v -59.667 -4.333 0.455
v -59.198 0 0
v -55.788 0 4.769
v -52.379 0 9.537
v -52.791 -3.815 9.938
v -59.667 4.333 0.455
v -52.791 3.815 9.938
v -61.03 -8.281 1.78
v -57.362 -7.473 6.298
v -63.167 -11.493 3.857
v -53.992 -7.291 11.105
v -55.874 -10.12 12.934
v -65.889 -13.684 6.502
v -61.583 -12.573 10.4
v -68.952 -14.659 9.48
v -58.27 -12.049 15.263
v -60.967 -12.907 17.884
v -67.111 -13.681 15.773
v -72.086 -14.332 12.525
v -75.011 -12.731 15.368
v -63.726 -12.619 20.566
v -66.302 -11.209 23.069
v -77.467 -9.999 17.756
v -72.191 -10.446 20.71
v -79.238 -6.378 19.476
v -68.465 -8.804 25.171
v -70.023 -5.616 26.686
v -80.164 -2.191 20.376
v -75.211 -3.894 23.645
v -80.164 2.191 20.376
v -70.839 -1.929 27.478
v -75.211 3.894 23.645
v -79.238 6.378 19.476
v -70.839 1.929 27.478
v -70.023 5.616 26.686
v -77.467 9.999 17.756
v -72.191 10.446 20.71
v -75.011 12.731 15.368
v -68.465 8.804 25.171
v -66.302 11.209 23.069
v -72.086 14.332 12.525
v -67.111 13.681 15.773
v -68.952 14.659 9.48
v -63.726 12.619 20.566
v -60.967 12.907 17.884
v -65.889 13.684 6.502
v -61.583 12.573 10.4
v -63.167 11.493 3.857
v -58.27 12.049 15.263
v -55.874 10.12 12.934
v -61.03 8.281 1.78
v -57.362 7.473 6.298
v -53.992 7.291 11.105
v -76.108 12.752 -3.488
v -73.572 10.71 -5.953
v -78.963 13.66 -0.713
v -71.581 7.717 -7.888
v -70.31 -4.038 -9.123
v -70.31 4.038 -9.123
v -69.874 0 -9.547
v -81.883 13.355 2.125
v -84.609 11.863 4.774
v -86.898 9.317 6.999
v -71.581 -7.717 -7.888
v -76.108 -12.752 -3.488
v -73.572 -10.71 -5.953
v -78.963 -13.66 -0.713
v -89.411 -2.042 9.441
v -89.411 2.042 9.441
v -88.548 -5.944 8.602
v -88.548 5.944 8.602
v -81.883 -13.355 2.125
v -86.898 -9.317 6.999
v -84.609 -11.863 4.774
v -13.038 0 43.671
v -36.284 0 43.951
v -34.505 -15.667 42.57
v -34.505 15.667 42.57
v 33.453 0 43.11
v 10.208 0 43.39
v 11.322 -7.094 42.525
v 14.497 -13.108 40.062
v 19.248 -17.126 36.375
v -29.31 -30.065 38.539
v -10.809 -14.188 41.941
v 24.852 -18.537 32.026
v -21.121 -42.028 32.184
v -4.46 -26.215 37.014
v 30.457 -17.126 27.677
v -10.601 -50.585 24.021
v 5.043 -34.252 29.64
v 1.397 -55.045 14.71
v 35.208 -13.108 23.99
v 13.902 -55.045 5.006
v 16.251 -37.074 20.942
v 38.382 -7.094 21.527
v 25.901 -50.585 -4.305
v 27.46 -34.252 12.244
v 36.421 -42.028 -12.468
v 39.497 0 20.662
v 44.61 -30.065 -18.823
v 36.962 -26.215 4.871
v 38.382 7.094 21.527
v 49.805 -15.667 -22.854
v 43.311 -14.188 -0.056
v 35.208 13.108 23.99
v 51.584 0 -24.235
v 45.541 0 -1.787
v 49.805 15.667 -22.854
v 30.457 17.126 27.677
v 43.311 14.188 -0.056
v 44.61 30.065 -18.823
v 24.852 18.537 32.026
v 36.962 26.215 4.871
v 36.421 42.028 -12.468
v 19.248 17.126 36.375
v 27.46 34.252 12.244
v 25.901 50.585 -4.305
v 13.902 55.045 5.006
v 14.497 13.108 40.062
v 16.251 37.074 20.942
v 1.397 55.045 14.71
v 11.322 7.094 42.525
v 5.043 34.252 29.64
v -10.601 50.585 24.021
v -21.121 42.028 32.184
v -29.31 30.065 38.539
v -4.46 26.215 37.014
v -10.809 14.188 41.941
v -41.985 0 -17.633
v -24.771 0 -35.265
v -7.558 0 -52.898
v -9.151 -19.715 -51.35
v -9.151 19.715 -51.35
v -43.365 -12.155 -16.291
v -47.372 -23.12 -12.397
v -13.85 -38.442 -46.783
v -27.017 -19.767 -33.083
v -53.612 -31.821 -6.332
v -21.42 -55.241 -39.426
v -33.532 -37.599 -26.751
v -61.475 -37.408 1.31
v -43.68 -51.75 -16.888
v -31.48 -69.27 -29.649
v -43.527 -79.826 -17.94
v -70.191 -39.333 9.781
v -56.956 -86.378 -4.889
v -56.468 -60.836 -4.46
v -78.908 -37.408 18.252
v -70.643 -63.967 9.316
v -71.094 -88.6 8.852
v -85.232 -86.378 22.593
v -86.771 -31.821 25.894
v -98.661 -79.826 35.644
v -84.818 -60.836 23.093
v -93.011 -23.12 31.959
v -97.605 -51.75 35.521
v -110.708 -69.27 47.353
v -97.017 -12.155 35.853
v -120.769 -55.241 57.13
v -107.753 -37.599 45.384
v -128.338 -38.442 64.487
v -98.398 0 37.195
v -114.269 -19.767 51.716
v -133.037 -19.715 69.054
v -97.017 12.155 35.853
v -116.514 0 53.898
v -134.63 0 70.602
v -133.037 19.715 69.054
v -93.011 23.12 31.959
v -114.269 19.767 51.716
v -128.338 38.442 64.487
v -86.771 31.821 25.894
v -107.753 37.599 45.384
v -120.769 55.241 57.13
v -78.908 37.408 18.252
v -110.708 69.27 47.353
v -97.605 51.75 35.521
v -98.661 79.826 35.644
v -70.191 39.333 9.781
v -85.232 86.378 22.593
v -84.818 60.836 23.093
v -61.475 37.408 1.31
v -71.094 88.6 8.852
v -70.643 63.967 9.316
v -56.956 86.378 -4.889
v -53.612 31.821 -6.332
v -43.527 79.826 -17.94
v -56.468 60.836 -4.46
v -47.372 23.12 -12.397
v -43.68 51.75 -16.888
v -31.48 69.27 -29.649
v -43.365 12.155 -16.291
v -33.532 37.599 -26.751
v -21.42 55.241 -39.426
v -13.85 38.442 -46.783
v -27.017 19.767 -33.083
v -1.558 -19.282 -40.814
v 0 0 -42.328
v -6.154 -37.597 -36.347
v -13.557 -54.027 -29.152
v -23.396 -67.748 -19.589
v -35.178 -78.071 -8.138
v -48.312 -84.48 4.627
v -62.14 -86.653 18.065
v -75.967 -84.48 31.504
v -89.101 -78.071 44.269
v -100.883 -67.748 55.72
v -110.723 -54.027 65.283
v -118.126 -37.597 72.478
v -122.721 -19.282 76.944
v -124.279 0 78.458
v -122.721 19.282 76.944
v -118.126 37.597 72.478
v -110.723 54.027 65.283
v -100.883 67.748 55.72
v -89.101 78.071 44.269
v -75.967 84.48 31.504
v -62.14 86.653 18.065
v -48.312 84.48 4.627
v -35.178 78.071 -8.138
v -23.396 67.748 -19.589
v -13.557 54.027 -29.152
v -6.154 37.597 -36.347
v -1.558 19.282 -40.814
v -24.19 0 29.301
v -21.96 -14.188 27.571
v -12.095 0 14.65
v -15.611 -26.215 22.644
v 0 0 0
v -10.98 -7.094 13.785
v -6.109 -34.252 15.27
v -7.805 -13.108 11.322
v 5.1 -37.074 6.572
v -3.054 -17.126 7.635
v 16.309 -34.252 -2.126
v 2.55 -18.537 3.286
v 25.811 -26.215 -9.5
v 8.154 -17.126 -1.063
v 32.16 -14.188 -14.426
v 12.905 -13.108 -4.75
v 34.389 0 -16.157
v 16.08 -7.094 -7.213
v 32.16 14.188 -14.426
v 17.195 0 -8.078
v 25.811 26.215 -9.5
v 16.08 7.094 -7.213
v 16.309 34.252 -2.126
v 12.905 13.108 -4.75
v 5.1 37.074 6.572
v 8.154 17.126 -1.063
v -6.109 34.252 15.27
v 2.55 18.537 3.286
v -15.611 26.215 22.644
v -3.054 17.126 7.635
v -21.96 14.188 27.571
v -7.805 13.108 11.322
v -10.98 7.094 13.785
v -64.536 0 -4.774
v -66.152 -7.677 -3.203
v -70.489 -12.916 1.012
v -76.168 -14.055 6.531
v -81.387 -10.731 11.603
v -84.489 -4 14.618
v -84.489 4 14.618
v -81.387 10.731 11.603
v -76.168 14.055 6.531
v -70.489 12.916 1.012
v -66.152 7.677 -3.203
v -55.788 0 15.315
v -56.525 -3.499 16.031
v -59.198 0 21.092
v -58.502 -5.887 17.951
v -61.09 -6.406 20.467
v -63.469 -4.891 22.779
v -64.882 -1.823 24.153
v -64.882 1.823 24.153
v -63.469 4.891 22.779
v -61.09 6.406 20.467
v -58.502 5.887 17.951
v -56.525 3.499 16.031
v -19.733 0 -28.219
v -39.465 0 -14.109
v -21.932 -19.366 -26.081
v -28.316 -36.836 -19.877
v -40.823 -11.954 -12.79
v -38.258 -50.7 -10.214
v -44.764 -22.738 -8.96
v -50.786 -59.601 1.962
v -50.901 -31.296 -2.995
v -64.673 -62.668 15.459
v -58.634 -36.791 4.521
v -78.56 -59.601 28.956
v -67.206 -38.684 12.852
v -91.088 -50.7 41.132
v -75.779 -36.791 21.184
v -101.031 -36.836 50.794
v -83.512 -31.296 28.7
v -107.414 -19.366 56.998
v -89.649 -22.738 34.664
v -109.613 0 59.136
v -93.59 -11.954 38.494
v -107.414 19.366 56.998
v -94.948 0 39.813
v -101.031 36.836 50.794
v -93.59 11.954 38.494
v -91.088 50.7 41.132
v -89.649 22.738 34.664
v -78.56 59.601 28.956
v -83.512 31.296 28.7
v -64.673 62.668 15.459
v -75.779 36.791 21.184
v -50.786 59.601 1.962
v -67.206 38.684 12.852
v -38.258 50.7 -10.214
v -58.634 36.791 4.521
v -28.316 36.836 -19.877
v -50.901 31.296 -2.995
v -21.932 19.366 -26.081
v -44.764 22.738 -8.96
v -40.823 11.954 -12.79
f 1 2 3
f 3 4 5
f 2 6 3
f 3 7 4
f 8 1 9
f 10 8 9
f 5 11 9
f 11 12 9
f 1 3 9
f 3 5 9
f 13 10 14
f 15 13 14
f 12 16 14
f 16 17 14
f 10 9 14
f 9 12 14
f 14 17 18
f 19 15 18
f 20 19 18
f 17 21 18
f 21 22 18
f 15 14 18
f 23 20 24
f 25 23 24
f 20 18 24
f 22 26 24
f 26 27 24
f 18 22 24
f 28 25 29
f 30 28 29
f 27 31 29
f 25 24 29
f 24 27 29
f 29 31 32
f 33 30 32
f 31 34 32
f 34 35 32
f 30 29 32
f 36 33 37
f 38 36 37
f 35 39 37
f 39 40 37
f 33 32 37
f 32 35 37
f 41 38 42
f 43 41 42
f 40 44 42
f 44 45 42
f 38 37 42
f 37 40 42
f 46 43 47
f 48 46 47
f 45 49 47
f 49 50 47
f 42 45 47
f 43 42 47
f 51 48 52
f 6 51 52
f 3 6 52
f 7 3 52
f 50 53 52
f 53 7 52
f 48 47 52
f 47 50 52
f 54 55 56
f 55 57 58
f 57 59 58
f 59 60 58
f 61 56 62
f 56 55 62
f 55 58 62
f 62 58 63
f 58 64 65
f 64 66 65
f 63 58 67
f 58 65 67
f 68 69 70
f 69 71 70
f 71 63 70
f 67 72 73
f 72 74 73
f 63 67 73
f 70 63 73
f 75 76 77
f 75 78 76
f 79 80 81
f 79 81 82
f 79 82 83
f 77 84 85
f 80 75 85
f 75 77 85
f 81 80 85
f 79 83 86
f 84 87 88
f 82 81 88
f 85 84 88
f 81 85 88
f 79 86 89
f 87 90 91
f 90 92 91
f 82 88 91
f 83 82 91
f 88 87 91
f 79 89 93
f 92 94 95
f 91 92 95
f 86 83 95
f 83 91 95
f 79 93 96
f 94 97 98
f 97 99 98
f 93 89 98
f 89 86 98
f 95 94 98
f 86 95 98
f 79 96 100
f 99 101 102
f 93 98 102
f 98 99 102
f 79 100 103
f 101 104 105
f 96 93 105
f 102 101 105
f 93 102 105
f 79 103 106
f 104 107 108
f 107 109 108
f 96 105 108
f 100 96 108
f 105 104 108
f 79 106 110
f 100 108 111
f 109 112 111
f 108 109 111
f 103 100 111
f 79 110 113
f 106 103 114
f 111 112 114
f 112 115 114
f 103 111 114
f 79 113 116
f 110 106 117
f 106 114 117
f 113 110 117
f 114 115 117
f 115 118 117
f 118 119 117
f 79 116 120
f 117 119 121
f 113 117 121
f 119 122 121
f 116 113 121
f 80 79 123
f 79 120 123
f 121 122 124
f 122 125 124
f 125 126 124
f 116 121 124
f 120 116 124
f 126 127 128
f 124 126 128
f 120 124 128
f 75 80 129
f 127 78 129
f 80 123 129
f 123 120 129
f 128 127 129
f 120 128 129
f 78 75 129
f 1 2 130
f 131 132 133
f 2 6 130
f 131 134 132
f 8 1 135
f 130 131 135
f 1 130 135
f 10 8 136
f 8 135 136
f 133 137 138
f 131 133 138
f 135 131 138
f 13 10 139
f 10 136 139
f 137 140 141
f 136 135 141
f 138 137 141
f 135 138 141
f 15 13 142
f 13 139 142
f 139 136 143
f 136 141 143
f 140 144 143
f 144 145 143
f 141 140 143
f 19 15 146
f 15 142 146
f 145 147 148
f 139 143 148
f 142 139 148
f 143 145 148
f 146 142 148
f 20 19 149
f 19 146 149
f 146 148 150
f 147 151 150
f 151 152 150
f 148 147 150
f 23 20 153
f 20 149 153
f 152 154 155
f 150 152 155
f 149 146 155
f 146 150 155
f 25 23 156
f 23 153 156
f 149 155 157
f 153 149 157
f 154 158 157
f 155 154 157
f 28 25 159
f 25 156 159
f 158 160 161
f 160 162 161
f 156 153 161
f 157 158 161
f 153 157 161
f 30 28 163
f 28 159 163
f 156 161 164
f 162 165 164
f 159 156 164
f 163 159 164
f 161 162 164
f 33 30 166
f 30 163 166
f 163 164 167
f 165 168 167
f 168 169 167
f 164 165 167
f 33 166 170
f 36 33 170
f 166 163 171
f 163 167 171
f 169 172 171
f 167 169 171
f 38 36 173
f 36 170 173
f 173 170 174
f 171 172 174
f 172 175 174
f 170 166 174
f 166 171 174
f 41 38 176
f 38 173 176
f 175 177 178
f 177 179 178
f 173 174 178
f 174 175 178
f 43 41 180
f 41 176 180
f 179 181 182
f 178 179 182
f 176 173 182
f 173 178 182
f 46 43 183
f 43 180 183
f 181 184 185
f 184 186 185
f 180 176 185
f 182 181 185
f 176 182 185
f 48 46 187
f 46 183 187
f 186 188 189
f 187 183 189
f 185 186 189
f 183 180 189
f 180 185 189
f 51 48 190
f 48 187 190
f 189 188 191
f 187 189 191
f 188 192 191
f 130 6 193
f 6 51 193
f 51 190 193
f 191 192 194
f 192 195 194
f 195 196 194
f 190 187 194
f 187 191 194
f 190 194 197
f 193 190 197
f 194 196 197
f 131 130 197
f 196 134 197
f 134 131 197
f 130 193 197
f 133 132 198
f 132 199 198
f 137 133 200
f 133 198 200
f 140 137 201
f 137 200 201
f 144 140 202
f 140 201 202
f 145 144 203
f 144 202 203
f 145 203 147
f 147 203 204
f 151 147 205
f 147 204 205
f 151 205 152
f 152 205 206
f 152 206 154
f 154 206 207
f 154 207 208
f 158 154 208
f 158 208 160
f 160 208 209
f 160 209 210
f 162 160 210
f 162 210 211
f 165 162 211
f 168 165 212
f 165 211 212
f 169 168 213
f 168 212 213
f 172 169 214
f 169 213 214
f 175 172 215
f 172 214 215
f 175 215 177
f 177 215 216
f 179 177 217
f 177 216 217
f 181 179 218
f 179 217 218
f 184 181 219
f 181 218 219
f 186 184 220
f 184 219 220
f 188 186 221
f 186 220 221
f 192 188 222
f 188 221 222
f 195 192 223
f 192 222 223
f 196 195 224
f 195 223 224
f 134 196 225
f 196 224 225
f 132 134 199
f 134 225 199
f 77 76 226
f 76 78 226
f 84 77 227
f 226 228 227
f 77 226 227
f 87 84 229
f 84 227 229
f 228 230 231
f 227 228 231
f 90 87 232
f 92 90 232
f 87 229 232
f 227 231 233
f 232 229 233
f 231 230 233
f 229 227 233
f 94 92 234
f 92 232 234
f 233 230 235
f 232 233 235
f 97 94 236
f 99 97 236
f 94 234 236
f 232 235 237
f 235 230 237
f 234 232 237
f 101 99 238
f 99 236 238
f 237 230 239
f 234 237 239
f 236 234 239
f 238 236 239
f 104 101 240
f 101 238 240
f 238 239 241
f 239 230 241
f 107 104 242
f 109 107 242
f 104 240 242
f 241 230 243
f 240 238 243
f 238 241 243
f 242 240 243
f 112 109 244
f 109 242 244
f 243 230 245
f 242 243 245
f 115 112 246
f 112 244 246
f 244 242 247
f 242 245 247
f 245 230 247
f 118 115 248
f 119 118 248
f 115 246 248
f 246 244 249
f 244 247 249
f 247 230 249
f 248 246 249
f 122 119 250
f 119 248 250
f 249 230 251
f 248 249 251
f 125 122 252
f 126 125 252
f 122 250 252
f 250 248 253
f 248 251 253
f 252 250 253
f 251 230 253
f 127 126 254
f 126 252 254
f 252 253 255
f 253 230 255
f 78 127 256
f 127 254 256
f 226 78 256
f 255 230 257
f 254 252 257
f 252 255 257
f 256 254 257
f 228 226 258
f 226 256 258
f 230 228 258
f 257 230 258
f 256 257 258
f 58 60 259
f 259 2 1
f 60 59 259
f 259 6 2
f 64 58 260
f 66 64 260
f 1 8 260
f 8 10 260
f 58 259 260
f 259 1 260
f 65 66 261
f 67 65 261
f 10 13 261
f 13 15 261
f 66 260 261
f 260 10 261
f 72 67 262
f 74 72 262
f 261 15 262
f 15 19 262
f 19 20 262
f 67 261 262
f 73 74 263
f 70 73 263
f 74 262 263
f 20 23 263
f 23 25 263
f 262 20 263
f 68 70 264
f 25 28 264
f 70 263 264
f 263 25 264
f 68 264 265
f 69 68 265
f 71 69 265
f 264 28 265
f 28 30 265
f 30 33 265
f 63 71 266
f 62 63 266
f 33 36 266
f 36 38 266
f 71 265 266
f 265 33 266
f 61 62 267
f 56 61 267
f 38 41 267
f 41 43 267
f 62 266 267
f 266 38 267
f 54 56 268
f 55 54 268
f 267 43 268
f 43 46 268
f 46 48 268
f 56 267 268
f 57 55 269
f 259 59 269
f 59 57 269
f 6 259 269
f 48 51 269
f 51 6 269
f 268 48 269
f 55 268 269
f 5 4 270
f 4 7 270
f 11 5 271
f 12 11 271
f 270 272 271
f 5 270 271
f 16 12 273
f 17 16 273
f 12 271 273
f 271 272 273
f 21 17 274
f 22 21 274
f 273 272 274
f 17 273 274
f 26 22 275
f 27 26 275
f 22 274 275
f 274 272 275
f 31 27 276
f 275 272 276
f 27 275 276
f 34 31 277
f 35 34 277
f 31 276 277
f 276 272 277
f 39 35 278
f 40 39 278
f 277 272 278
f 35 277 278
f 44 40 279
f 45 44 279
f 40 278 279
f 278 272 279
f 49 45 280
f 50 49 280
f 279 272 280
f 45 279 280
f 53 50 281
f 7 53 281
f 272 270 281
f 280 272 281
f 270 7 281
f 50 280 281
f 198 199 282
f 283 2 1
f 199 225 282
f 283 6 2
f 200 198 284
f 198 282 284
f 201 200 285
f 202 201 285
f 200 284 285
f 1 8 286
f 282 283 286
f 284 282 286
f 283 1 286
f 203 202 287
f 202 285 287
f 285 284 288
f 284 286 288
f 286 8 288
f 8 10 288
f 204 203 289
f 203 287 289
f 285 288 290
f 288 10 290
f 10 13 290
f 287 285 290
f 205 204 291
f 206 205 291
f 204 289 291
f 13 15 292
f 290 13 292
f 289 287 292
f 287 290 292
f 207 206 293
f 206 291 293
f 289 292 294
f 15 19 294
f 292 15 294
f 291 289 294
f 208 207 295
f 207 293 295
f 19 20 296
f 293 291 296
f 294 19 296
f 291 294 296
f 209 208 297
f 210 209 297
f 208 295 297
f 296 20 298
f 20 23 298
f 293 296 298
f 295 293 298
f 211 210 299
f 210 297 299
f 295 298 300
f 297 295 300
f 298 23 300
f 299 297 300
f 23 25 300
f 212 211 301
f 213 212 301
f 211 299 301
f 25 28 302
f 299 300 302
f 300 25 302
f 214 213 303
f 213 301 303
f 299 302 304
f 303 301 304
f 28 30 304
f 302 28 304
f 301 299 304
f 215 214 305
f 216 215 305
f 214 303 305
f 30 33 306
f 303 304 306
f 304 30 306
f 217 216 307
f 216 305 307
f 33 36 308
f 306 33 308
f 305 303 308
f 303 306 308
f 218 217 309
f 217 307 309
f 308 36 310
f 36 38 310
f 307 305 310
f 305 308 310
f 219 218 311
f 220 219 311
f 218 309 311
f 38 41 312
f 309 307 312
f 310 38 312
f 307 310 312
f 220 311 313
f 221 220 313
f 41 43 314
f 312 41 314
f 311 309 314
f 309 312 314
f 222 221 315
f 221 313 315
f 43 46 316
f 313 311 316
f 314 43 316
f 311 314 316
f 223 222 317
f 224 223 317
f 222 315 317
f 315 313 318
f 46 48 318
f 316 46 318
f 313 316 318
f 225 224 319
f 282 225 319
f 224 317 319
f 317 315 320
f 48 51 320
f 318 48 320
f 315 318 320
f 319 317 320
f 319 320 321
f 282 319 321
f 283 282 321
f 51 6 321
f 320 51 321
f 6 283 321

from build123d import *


with BuildPart() as f1:
    # F0 (on Front) → F1 (revolve)
    with BuildSketch(Plane.XZ):
        Polygon((33.4534868598, 43.1100986898), (-36.2842865288, 43.9511463046), (0, 0), align=None)
    revolve(axis=Axis((16.7267434299, 0, 21.5550493449), (0.6130656985, 0, 0.7900319293)))


with BuildPart() as f3:
    # F2 (on Front) → F3 (revolve)
    with BuildSketch(Plane.XZ):
        Polygon((-7.5580657161, -52.8982158507), (0, -42.3277616501), (-59.1981709003, 0), align=None)
    revolve(axis=Axis((-69.4477334619, 0, 10.5459876359), (-0.6969566993, 0, -0.7171132123)))


with BuildPart() as f3b:
    # F2 (on Front) → F3, piece 2 (revolve)
    with BuildSketch(Plane.XZ):
        Polygon((-69.8737586331, -9.5474188415), (-59.1981709003, 0), (-52.3788214959, 9.5373106382), (-59.1981709003, 21.0919752717), (-79.6972960234, 0), align=None)
    revolve(axis=Axis((-69.4477334619, 0, 10.5459876359), (-0.6969566993, 0, -0.7171132123)))


solid = Compound([f1.part, f3.part, f3b.part])
